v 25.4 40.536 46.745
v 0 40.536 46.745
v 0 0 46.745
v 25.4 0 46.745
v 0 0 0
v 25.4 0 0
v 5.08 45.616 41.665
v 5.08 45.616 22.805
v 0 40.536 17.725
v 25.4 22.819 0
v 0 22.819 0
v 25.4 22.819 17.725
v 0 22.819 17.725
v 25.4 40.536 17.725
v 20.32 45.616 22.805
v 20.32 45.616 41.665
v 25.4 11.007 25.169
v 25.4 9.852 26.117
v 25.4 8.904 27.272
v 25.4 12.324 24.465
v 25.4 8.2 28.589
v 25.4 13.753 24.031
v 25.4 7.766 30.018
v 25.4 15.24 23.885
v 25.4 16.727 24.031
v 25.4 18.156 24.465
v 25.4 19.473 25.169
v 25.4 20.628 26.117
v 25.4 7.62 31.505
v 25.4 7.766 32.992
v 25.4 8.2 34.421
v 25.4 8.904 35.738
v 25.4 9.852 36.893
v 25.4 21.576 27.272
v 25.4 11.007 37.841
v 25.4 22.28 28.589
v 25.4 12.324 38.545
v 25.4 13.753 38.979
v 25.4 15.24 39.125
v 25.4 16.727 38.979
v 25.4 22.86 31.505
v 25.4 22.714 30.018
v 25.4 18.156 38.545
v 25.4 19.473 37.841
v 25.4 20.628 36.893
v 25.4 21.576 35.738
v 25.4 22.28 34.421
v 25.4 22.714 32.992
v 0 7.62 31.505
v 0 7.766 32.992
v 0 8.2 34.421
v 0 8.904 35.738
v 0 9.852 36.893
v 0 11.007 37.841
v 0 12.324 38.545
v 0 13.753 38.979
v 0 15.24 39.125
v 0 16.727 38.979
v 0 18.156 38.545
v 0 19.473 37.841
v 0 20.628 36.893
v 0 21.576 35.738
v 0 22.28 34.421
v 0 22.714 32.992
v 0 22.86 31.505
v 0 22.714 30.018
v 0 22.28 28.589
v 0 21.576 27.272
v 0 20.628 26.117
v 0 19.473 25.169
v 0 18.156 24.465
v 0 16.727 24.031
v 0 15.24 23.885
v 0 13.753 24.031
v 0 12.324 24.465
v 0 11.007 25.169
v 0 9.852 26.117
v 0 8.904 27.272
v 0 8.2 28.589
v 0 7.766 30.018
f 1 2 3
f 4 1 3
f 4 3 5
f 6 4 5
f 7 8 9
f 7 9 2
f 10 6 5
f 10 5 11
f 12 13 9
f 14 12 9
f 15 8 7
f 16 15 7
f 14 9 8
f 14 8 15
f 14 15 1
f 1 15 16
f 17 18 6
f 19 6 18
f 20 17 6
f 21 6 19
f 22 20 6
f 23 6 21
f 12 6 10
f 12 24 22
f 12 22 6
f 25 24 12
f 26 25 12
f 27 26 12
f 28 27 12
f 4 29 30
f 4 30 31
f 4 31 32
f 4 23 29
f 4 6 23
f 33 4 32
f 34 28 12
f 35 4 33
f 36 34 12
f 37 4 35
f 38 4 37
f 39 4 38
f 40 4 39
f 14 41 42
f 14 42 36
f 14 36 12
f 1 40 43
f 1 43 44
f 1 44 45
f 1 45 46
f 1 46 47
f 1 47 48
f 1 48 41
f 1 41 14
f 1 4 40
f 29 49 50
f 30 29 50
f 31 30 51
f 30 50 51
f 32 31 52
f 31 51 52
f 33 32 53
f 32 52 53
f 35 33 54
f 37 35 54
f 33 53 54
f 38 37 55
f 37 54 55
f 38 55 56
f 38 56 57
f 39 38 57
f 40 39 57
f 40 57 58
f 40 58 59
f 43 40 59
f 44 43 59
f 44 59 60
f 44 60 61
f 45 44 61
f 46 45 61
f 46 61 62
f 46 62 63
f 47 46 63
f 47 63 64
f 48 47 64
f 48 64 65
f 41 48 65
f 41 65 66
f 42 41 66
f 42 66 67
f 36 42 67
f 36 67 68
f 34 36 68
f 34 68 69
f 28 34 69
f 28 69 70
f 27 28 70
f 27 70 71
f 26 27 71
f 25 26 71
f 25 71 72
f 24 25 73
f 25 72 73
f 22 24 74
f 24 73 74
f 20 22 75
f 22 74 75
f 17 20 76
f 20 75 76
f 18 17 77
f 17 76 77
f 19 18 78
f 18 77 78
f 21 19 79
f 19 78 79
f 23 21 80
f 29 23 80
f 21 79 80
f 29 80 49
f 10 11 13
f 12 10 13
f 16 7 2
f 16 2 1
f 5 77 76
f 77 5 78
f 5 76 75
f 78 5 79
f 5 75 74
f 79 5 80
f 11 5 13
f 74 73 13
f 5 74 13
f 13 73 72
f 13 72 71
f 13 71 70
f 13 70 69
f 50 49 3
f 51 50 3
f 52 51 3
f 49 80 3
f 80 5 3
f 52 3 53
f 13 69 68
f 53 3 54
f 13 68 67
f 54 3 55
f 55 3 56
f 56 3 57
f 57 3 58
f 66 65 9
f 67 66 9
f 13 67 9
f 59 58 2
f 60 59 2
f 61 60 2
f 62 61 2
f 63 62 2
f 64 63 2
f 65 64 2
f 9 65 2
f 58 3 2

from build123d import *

# Parameters (mm, degrees)
F1_DEPTH = 25.4
F3_D     = 15.24
F4_SIZE  = 5.08


with BuildPart() as f1:
    # F0 (on Right) → F1 (new body)
    with BuildSketch(Plane.YZ):
        Polygon((0, 46.745047), (0, 0), (22.818567, 0), (22.818567, 17.724711), (45.616407, 17.724711), (45.616407, 46.745047), align=None)
    extrude(amount=F1_DEPTH)

    # F3 (through all)
    with Locations(Plane.YZ.offset(25.4)):
        with Locations((15.24, 31.505047)):
            Hole(F3_D / 2)

    # F4
    f4_edges = [f1.edges().sort_by_distance(p)[0] for p in [
        (12.7, 45.616407, 17.724711),
        (0, 45.616407, 32.234879),
        (12.7, 45.616407, 46.745047),
        (25.4, 45.616407, 32.234879),
    ]]
    chamfer(f4_edges, length=F4_SIZE)


solid = f1.part
